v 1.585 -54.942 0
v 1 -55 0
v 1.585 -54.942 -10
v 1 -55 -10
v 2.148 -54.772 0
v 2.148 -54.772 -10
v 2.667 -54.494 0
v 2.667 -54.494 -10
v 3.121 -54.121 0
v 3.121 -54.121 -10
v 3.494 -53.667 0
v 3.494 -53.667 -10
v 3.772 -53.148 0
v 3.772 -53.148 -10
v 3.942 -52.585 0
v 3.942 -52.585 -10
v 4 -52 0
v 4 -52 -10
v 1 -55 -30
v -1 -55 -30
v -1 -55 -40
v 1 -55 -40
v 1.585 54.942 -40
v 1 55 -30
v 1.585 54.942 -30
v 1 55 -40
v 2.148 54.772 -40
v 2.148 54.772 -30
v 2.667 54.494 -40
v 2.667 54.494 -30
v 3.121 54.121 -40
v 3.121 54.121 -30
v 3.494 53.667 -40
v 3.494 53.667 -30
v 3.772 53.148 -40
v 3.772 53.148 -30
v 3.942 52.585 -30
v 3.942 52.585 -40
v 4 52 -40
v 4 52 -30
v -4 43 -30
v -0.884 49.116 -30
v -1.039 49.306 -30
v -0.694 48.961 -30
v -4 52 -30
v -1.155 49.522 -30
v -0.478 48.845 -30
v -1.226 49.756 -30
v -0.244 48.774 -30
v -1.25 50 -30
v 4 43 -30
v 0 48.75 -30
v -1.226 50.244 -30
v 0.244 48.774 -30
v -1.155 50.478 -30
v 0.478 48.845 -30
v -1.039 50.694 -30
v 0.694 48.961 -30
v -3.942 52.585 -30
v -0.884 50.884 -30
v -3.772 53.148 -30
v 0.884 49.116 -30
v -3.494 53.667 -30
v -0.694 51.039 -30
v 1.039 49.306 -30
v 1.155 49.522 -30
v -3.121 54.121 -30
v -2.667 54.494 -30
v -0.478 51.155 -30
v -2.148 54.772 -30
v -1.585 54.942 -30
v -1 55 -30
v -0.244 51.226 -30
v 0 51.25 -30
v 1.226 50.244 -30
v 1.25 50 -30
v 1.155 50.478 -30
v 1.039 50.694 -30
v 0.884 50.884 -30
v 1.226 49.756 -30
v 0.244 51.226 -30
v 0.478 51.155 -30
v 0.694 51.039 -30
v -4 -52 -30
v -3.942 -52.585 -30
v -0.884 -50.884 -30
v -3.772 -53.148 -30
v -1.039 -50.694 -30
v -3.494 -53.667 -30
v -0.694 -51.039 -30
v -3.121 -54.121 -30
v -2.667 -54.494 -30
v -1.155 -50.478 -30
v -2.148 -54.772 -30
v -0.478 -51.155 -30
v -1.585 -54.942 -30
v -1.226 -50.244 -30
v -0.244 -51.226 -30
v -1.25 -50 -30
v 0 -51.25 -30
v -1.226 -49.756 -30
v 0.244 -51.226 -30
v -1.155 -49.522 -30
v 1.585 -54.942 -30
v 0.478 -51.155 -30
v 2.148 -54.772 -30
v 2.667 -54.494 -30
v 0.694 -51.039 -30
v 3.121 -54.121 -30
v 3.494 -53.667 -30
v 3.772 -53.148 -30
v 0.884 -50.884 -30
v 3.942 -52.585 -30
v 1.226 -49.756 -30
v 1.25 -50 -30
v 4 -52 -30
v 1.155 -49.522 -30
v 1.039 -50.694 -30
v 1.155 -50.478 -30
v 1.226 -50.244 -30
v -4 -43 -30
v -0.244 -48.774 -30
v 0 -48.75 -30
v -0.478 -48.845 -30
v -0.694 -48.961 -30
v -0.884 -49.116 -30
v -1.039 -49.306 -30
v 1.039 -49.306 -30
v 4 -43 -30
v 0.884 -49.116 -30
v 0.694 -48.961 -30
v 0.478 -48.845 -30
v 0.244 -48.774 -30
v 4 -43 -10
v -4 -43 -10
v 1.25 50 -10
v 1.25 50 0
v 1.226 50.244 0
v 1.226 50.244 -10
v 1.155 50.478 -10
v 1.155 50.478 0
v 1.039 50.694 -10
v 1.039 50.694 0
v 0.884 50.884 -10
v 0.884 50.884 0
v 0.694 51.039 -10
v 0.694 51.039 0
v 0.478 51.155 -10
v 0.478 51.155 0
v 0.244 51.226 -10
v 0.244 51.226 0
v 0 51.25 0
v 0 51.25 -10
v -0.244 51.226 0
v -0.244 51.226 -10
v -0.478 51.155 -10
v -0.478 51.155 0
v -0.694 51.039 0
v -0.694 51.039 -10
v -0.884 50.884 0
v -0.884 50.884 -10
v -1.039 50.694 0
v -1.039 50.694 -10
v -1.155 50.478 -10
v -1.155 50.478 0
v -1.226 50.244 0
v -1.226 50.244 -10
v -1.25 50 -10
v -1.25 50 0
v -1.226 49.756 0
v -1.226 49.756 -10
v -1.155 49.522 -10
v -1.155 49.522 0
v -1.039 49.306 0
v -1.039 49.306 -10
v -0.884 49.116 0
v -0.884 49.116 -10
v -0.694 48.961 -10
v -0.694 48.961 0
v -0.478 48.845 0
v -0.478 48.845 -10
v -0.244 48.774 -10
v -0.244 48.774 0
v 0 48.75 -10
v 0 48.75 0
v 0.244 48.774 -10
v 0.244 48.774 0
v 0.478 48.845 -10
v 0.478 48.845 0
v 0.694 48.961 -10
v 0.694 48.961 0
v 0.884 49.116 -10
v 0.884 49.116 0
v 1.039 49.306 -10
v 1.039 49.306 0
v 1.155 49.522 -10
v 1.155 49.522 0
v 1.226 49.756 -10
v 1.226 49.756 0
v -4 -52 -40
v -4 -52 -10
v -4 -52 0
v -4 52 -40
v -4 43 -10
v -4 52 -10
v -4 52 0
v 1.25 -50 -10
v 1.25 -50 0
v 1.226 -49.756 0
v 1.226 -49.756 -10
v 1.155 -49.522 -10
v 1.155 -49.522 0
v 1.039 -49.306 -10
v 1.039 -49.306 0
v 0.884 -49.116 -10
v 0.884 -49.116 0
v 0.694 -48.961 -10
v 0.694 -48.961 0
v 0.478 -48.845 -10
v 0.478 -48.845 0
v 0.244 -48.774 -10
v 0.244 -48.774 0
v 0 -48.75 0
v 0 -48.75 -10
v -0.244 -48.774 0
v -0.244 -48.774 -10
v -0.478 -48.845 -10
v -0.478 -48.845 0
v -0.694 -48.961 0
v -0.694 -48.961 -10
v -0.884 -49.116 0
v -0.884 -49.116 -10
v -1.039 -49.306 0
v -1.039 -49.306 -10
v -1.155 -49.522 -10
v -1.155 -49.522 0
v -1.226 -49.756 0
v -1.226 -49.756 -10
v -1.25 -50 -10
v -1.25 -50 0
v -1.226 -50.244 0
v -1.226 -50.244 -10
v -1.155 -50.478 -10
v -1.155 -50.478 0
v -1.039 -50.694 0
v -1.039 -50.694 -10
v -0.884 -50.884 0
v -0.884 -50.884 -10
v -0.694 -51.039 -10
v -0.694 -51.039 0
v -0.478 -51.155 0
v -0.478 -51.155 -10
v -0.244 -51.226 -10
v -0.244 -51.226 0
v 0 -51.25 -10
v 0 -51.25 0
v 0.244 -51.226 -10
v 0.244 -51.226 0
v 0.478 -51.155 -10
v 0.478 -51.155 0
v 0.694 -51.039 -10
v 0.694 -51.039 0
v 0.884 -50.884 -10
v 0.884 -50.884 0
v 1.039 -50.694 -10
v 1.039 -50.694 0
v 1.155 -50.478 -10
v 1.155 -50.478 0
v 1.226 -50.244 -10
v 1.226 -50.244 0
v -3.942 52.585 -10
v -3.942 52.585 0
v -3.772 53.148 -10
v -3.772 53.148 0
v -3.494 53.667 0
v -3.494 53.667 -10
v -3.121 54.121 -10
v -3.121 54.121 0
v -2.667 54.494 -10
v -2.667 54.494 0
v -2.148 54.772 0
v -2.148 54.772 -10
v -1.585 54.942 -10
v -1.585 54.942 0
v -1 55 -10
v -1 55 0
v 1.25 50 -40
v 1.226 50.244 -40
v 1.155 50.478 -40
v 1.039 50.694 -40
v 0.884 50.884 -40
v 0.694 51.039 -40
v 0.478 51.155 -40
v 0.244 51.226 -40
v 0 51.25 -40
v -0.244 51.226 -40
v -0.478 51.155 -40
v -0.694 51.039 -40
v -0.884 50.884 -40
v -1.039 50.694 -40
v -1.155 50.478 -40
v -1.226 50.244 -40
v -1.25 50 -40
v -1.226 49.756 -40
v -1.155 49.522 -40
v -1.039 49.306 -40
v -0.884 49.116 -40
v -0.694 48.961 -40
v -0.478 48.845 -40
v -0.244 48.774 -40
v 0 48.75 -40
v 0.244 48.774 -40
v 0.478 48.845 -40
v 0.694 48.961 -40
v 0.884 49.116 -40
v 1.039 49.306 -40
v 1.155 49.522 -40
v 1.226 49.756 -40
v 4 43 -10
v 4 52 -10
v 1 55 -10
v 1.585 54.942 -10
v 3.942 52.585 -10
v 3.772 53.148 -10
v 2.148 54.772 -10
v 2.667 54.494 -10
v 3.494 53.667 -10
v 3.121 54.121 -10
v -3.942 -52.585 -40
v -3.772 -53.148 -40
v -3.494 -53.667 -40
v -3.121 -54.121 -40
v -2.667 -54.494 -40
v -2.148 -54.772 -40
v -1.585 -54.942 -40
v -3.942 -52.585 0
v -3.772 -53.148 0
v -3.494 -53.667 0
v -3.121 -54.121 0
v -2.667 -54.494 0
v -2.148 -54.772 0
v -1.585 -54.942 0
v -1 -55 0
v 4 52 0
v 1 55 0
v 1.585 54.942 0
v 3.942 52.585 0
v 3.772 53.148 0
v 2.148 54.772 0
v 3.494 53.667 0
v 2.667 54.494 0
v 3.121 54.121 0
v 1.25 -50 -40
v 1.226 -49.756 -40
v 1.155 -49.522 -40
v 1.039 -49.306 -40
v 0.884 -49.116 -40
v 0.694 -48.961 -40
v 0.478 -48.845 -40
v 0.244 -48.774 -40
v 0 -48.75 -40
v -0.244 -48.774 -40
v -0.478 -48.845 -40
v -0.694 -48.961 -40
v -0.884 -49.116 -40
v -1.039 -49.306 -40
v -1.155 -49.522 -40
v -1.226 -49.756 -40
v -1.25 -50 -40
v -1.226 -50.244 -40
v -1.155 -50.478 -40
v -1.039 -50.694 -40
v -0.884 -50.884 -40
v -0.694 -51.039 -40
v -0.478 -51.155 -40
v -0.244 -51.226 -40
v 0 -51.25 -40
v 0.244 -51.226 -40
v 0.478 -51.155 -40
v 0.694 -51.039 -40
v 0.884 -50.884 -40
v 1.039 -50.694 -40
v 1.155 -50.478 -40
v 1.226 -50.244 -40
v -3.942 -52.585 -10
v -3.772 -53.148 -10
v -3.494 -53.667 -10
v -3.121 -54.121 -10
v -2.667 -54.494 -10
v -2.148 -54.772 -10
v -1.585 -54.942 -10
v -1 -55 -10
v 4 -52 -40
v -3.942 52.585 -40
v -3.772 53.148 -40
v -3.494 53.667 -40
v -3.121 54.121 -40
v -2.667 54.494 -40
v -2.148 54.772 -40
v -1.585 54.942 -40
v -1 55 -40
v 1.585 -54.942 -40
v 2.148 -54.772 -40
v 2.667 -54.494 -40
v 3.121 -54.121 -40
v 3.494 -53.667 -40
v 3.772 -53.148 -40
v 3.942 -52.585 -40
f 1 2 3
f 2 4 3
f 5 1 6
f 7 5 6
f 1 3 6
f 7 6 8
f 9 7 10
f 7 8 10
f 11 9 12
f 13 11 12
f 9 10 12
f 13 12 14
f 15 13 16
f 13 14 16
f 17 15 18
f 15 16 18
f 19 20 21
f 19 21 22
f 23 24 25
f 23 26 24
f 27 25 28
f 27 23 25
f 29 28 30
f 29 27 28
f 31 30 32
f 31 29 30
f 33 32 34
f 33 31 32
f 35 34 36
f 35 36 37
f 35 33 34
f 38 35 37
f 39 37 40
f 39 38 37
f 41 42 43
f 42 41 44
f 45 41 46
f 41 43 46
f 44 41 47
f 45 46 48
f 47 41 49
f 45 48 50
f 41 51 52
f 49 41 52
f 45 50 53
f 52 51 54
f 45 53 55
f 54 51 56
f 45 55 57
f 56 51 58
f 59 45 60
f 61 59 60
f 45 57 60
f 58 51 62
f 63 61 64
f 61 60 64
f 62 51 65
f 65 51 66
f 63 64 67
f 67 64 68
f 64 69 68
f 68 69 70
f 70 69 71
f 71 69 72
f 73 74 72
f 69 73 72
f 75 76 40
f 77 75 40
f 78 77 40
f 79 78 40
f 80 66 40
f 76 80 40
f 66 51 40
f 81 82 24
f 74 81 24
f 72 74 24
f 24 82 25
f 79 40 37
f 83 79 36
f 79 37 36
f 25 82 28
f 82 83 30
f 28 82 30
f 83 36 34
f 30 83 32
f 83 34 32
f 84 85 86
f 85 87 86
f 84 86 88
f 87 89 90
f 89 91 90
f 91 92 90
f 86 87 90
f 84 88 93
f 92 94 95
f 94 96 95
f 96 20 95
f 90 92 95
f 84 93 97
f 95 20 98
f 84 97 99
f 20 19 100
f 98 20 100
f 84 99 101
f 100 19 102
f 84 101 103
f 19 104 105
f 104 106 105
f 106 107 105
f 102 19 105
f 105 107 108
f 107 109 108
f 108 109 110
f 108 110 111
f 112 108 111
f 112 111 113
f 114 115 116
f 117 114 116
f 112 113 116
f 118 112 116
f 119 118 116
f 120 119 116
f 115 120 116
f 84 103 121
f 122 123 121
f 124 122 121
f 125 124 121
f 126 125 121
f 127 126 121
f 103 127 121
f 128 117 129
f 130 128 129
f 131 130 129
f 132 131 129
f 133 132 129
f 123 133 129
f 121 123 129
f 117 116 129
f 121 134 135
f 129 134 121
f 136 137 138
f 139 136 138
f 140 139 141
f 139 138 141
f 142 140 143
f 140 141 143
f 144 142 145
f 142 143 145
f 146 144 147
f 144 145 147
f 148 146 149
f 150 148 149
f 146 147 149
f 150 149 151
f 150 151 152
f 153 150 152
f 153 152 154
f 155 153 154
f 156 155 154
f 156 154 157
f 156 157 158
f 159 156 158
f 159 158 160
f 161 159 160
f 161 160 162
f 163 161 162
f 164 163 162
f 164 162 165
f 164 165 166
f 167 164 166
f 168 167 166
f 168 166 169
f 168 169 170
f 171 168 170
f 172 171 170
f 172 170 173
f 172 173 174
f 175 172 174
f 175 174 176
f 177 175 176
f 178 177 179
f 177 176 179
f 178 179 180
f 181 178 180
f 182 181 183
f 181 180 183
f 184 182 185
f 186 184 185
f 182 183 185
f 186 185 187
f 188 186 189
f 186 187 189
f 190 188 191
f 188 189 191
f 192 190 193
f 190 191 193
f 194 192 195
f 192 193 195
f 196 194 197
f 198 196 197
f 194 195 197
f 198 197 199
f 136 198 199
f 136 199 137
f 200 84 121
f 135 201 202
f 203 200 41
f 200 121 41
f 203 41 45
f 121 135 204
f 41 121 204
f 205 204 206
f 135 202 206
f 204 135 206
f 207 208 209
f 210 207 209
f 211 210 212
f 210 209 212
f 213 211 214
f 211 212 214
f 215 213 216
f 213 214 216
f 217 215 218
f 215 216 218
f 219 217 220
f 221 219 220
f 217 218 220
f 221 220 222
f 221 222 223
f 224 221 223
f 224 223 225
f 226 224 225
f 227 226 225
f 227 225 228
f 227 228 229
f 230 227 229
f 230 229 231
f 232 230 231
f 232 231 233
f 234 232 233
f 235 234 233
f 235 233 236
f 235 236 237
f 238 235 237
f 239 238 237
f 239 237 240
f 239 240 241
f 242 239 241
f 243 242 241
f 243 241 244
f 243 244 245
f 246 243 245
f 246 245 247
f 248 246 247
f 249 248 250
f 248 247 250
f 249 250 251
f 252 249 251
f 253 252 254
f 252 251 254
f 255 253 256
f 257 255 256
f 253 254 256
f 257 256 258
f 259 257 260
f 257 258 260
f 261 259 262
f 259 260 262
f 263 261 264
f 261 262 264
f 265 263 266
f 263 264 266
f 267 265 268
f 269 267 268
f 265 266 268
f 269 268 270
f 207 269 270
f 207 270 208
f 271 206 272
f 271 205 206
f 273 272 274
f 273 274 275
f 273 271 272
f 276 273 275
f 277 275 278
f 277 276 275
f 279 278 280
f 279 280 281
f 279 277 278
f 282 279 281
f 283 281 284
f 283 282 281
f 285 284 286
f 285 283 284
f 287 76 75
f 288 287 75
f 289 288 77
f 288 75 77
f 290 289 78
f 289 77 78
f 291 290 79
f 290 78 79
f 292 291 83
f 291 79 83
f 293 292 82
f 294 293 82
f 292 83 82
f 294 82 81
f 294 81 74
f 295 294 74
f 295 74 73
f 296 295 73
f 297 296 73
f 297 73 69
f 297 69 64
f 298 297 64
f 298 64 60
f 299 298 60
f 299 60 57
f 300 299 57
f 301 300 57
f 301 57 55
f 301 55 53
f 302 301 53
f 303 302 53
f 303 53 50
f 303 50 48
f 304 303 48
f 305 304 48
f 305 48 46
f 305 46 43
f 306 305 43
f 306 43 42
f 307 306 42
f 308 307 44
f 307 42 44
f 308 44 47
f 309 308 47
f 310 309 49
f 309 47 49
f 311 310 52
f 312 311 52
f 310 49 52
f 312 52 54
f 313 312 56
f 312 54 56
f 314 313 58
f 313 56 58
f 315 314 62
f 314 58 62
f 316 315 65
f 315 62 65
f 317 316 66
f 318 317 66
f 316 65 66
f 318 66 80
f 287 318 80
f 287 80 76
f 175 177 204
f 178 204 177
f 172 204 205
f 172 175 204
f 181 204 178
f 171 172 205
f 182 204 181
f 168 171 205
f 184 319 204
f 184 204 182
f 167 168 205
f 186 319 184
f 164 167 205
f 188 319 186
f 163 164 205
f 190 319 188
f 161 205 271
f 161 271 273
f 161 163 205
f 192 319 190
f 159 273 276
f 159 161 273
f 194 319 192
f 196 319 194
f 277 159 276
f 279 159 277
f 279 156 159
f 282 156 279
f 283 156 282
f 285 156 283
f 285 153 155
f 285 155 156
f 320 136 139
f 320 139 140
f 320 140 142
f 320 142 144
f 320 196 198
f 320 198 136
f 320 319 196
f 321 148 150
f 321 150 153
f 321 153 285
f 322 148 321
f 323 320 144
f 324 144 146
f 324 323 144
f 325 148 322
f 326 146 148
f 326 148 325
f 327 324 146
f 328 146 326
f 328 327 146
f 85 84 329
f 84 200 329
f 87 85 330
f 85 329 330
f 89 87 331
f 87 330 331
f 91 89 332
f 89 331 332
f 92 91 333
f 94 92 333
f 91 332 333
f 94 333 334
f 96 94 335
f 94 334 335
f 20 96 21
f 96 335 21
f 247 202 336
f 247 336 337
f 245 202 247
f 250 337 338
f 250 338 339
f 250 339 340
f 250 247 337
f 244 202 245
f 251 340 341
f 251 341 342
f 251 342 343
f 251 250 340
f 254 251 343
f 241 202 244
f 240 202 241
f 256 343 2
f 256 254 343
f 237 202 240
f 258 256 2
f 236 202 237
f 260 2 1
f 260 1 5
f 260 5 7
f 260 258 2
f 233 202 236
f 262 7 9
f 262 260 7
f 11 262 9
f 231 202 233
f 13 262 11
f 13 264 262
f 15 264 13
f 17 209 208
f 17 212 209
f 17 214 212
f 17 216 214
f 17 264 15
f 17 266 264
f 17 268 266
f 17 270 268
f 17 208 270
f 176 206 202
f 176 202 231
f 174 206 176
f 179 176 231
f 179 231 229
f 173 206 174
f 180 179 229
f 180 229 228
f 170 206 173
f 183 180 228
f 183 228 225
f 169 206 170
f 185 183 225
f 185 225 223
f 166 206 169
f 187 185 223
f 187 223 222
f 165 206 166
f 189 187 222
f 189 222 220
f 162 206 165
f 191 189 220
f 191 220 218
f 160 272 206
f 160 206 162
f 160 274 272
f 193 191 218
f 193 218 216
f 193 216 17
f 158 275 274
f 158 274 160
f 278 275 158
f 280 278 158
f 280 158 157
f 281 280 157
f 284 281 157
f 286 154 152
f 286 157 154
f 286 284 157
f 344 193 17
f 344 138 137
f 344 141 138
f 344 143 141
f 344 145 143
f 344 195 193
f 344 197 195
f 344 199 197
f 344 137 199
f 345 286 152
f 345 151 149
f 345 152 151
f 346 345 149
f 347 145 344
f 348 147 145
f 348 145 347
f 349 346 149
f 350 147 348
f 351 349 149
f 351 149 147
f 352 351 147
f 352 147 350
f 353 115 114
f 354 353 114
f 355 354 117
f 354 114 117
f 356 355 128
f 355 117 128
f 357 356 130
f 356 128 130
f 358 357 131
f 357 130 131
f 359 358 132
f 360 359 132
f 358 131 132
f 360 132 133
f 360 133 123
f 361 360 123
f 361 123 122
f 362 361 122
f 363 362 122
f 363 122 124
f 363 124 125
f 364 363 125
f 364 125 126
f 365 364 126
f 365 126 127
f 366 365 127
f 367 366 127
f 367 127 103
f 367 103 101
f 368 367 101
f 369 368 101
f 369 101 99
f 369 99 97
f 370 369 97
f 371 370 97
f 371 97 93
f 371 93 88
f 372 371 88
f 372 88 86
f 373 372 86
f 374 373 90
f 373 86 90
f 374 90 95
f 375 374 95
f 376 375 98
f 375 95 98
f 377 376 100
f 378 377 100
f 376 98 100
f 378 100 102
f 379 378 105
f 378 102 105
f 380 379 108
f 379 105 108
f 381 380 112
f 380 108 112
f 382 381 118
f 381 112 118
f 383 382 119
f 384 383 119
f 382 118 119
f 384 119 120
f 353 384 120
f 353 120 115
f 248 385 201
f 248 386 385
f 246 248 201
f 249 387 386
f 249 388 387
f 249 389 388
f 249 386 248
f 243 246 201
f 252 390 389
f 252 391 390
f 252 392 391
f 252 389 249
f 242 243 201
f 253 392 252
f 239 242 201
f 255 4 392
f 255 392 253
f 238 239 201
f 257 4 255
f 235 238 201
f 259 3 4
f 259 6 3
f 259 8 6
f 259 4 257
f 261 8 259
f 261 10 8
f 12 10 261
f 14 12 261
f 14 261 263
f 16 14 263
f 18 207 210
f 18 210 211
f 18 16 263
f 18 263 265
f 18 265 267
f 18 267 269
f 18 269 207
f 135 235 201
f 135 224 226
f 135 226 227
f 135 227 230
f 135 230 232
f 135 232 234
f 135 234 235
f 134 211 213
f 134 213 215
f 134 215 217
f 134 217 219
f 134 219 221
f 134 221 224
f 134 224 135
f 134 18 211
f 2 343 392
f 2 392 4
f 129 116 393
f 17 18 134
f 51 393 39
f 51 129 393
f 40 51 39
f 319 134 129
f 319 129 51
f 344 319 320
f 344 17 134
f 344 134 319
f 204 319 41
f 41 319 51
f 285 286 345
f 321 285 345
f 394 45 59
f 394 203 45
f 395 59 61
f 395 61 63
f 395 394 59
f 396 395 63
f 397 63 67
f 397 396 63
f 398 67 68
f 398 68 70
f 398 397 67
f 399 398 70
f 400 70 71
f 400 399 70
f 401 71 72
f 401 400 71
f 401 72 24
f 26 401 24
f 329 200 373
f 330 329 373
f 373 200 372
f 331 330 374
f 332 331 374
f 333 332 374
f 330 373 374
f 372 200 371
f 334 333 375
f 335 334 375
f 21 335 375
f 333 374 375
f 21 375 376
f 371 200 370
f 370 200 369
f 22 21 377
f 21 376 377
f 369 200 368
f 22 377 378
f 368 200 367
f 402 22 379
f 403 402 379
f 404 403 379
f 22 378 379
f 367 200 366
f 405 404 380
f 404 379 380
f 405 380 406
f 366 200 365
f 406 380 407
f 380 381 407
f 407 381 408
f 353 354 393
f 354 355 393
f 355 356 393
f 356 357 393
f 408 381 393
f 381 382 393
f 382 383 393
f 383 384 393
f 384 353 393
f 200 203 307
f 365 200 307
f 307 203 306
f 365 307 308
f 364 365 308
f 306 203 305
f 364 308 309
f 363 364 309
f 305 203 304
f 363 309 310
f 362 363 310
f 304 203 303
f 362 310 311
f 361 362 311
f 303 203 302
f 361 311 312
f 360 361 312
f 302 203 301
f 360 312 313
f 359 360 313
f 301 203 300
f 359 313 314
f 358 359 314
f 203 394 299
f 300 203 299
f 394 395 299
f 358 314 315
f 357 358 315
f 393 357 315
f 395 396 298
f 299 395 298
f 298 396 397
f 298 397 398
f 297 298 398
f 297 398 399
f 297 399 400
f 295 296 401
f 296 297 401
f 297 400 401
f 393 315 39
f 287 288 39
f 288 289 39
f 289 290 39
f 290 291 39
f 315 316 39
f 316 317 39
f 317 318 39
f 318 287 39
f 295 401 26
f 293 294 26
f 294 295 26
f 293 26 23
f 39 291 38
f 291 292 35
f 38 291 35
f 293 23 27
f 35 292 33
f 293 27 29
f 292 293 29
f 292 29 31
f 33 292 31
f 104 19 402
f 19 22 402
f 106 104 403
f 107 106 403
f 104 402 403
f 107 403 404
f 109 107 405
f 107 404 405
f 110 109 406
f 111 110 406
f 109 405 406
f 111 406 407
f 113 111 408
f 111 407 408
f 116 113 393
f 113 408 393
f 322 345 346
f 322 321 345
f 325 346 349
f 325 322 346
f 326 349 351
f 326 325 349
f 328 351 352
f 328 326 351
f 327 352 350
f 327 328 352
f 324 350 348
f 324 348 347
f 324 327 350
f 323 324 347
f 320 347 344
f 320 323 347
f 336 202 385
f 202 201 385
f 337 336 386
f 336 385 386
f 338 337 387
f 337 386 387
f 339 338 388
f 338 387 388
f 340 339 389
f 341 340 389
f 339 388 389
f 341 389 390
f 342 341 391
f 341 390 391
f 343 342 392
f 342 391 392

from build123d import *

# Parameters (mm, degrees)
SKETCH1_W           = 8
SKETCH1_H           = 110
BOSS_EXTRUDE1_DEPTH = 40
SKETCH2_W           = 20
SKETCH2_H           = 24
CUT_EXTRUDE1_DEPTH  = 9
FILLET1_R           = 3
SKETCH3_R           = 1.25
CUT_EXTRUDE2_DEPTH  = 41


with BuildPart() as part:
    # Sketch1 → Boss-Extrude1 (new body)
    with BuildSketch(Plane.XY):
        Rectangle(SKETCH1_W, SKETCH1_H)
    extrude(amount=-BOSS_EXTRUDE1_DEPTH)

    # Sketch2 → Cut-Extrude1 (cut, through all)
    with BuildSketch(Plane(origin=(4, 0, 0), x_dir=(0, 0, -1), z_dir=(1, 0, 0))):
        with Locations((20, 55)):
            Rectangle(SKETCH2_W, SKETCH2_H)
        with Locations((20, -55)):
            Rectangle(SKETCH2_W, SKETCH2_H)
    extrude(amount=-CUT_EXTRUDE1_DEPTH, mode=Mode.SUBTRACT)

    # Fillet1
    fillet1_edges = [part.edges().sort_by_distance(p)[0] for p in [
        (4, 55, -5),
        (-4, 55, -5),
        (-4, -55, -5),
        (4, -55, -5),
        (4, -55, -35),
        (-4, -55, -35),
        (-4, 55, -35),
        (4, 55, -35),
    ]]
    fillet(fillet1_edges, radius=FILLET1_R)

    # Sketch3 → Cut-Extrude2 (cut, through all)
    with BuildSketch(Plane.XY):
        with Locations((0, 50)):
            Circle(SKETCH3_R)
        with Locations((0, -50)):
            Circle(SKETCH3_R)
    extrude(amount=-CUT_EXTRUDE2_DEPTH, mode=Mode.SUBTRACT)


solid = part.part
